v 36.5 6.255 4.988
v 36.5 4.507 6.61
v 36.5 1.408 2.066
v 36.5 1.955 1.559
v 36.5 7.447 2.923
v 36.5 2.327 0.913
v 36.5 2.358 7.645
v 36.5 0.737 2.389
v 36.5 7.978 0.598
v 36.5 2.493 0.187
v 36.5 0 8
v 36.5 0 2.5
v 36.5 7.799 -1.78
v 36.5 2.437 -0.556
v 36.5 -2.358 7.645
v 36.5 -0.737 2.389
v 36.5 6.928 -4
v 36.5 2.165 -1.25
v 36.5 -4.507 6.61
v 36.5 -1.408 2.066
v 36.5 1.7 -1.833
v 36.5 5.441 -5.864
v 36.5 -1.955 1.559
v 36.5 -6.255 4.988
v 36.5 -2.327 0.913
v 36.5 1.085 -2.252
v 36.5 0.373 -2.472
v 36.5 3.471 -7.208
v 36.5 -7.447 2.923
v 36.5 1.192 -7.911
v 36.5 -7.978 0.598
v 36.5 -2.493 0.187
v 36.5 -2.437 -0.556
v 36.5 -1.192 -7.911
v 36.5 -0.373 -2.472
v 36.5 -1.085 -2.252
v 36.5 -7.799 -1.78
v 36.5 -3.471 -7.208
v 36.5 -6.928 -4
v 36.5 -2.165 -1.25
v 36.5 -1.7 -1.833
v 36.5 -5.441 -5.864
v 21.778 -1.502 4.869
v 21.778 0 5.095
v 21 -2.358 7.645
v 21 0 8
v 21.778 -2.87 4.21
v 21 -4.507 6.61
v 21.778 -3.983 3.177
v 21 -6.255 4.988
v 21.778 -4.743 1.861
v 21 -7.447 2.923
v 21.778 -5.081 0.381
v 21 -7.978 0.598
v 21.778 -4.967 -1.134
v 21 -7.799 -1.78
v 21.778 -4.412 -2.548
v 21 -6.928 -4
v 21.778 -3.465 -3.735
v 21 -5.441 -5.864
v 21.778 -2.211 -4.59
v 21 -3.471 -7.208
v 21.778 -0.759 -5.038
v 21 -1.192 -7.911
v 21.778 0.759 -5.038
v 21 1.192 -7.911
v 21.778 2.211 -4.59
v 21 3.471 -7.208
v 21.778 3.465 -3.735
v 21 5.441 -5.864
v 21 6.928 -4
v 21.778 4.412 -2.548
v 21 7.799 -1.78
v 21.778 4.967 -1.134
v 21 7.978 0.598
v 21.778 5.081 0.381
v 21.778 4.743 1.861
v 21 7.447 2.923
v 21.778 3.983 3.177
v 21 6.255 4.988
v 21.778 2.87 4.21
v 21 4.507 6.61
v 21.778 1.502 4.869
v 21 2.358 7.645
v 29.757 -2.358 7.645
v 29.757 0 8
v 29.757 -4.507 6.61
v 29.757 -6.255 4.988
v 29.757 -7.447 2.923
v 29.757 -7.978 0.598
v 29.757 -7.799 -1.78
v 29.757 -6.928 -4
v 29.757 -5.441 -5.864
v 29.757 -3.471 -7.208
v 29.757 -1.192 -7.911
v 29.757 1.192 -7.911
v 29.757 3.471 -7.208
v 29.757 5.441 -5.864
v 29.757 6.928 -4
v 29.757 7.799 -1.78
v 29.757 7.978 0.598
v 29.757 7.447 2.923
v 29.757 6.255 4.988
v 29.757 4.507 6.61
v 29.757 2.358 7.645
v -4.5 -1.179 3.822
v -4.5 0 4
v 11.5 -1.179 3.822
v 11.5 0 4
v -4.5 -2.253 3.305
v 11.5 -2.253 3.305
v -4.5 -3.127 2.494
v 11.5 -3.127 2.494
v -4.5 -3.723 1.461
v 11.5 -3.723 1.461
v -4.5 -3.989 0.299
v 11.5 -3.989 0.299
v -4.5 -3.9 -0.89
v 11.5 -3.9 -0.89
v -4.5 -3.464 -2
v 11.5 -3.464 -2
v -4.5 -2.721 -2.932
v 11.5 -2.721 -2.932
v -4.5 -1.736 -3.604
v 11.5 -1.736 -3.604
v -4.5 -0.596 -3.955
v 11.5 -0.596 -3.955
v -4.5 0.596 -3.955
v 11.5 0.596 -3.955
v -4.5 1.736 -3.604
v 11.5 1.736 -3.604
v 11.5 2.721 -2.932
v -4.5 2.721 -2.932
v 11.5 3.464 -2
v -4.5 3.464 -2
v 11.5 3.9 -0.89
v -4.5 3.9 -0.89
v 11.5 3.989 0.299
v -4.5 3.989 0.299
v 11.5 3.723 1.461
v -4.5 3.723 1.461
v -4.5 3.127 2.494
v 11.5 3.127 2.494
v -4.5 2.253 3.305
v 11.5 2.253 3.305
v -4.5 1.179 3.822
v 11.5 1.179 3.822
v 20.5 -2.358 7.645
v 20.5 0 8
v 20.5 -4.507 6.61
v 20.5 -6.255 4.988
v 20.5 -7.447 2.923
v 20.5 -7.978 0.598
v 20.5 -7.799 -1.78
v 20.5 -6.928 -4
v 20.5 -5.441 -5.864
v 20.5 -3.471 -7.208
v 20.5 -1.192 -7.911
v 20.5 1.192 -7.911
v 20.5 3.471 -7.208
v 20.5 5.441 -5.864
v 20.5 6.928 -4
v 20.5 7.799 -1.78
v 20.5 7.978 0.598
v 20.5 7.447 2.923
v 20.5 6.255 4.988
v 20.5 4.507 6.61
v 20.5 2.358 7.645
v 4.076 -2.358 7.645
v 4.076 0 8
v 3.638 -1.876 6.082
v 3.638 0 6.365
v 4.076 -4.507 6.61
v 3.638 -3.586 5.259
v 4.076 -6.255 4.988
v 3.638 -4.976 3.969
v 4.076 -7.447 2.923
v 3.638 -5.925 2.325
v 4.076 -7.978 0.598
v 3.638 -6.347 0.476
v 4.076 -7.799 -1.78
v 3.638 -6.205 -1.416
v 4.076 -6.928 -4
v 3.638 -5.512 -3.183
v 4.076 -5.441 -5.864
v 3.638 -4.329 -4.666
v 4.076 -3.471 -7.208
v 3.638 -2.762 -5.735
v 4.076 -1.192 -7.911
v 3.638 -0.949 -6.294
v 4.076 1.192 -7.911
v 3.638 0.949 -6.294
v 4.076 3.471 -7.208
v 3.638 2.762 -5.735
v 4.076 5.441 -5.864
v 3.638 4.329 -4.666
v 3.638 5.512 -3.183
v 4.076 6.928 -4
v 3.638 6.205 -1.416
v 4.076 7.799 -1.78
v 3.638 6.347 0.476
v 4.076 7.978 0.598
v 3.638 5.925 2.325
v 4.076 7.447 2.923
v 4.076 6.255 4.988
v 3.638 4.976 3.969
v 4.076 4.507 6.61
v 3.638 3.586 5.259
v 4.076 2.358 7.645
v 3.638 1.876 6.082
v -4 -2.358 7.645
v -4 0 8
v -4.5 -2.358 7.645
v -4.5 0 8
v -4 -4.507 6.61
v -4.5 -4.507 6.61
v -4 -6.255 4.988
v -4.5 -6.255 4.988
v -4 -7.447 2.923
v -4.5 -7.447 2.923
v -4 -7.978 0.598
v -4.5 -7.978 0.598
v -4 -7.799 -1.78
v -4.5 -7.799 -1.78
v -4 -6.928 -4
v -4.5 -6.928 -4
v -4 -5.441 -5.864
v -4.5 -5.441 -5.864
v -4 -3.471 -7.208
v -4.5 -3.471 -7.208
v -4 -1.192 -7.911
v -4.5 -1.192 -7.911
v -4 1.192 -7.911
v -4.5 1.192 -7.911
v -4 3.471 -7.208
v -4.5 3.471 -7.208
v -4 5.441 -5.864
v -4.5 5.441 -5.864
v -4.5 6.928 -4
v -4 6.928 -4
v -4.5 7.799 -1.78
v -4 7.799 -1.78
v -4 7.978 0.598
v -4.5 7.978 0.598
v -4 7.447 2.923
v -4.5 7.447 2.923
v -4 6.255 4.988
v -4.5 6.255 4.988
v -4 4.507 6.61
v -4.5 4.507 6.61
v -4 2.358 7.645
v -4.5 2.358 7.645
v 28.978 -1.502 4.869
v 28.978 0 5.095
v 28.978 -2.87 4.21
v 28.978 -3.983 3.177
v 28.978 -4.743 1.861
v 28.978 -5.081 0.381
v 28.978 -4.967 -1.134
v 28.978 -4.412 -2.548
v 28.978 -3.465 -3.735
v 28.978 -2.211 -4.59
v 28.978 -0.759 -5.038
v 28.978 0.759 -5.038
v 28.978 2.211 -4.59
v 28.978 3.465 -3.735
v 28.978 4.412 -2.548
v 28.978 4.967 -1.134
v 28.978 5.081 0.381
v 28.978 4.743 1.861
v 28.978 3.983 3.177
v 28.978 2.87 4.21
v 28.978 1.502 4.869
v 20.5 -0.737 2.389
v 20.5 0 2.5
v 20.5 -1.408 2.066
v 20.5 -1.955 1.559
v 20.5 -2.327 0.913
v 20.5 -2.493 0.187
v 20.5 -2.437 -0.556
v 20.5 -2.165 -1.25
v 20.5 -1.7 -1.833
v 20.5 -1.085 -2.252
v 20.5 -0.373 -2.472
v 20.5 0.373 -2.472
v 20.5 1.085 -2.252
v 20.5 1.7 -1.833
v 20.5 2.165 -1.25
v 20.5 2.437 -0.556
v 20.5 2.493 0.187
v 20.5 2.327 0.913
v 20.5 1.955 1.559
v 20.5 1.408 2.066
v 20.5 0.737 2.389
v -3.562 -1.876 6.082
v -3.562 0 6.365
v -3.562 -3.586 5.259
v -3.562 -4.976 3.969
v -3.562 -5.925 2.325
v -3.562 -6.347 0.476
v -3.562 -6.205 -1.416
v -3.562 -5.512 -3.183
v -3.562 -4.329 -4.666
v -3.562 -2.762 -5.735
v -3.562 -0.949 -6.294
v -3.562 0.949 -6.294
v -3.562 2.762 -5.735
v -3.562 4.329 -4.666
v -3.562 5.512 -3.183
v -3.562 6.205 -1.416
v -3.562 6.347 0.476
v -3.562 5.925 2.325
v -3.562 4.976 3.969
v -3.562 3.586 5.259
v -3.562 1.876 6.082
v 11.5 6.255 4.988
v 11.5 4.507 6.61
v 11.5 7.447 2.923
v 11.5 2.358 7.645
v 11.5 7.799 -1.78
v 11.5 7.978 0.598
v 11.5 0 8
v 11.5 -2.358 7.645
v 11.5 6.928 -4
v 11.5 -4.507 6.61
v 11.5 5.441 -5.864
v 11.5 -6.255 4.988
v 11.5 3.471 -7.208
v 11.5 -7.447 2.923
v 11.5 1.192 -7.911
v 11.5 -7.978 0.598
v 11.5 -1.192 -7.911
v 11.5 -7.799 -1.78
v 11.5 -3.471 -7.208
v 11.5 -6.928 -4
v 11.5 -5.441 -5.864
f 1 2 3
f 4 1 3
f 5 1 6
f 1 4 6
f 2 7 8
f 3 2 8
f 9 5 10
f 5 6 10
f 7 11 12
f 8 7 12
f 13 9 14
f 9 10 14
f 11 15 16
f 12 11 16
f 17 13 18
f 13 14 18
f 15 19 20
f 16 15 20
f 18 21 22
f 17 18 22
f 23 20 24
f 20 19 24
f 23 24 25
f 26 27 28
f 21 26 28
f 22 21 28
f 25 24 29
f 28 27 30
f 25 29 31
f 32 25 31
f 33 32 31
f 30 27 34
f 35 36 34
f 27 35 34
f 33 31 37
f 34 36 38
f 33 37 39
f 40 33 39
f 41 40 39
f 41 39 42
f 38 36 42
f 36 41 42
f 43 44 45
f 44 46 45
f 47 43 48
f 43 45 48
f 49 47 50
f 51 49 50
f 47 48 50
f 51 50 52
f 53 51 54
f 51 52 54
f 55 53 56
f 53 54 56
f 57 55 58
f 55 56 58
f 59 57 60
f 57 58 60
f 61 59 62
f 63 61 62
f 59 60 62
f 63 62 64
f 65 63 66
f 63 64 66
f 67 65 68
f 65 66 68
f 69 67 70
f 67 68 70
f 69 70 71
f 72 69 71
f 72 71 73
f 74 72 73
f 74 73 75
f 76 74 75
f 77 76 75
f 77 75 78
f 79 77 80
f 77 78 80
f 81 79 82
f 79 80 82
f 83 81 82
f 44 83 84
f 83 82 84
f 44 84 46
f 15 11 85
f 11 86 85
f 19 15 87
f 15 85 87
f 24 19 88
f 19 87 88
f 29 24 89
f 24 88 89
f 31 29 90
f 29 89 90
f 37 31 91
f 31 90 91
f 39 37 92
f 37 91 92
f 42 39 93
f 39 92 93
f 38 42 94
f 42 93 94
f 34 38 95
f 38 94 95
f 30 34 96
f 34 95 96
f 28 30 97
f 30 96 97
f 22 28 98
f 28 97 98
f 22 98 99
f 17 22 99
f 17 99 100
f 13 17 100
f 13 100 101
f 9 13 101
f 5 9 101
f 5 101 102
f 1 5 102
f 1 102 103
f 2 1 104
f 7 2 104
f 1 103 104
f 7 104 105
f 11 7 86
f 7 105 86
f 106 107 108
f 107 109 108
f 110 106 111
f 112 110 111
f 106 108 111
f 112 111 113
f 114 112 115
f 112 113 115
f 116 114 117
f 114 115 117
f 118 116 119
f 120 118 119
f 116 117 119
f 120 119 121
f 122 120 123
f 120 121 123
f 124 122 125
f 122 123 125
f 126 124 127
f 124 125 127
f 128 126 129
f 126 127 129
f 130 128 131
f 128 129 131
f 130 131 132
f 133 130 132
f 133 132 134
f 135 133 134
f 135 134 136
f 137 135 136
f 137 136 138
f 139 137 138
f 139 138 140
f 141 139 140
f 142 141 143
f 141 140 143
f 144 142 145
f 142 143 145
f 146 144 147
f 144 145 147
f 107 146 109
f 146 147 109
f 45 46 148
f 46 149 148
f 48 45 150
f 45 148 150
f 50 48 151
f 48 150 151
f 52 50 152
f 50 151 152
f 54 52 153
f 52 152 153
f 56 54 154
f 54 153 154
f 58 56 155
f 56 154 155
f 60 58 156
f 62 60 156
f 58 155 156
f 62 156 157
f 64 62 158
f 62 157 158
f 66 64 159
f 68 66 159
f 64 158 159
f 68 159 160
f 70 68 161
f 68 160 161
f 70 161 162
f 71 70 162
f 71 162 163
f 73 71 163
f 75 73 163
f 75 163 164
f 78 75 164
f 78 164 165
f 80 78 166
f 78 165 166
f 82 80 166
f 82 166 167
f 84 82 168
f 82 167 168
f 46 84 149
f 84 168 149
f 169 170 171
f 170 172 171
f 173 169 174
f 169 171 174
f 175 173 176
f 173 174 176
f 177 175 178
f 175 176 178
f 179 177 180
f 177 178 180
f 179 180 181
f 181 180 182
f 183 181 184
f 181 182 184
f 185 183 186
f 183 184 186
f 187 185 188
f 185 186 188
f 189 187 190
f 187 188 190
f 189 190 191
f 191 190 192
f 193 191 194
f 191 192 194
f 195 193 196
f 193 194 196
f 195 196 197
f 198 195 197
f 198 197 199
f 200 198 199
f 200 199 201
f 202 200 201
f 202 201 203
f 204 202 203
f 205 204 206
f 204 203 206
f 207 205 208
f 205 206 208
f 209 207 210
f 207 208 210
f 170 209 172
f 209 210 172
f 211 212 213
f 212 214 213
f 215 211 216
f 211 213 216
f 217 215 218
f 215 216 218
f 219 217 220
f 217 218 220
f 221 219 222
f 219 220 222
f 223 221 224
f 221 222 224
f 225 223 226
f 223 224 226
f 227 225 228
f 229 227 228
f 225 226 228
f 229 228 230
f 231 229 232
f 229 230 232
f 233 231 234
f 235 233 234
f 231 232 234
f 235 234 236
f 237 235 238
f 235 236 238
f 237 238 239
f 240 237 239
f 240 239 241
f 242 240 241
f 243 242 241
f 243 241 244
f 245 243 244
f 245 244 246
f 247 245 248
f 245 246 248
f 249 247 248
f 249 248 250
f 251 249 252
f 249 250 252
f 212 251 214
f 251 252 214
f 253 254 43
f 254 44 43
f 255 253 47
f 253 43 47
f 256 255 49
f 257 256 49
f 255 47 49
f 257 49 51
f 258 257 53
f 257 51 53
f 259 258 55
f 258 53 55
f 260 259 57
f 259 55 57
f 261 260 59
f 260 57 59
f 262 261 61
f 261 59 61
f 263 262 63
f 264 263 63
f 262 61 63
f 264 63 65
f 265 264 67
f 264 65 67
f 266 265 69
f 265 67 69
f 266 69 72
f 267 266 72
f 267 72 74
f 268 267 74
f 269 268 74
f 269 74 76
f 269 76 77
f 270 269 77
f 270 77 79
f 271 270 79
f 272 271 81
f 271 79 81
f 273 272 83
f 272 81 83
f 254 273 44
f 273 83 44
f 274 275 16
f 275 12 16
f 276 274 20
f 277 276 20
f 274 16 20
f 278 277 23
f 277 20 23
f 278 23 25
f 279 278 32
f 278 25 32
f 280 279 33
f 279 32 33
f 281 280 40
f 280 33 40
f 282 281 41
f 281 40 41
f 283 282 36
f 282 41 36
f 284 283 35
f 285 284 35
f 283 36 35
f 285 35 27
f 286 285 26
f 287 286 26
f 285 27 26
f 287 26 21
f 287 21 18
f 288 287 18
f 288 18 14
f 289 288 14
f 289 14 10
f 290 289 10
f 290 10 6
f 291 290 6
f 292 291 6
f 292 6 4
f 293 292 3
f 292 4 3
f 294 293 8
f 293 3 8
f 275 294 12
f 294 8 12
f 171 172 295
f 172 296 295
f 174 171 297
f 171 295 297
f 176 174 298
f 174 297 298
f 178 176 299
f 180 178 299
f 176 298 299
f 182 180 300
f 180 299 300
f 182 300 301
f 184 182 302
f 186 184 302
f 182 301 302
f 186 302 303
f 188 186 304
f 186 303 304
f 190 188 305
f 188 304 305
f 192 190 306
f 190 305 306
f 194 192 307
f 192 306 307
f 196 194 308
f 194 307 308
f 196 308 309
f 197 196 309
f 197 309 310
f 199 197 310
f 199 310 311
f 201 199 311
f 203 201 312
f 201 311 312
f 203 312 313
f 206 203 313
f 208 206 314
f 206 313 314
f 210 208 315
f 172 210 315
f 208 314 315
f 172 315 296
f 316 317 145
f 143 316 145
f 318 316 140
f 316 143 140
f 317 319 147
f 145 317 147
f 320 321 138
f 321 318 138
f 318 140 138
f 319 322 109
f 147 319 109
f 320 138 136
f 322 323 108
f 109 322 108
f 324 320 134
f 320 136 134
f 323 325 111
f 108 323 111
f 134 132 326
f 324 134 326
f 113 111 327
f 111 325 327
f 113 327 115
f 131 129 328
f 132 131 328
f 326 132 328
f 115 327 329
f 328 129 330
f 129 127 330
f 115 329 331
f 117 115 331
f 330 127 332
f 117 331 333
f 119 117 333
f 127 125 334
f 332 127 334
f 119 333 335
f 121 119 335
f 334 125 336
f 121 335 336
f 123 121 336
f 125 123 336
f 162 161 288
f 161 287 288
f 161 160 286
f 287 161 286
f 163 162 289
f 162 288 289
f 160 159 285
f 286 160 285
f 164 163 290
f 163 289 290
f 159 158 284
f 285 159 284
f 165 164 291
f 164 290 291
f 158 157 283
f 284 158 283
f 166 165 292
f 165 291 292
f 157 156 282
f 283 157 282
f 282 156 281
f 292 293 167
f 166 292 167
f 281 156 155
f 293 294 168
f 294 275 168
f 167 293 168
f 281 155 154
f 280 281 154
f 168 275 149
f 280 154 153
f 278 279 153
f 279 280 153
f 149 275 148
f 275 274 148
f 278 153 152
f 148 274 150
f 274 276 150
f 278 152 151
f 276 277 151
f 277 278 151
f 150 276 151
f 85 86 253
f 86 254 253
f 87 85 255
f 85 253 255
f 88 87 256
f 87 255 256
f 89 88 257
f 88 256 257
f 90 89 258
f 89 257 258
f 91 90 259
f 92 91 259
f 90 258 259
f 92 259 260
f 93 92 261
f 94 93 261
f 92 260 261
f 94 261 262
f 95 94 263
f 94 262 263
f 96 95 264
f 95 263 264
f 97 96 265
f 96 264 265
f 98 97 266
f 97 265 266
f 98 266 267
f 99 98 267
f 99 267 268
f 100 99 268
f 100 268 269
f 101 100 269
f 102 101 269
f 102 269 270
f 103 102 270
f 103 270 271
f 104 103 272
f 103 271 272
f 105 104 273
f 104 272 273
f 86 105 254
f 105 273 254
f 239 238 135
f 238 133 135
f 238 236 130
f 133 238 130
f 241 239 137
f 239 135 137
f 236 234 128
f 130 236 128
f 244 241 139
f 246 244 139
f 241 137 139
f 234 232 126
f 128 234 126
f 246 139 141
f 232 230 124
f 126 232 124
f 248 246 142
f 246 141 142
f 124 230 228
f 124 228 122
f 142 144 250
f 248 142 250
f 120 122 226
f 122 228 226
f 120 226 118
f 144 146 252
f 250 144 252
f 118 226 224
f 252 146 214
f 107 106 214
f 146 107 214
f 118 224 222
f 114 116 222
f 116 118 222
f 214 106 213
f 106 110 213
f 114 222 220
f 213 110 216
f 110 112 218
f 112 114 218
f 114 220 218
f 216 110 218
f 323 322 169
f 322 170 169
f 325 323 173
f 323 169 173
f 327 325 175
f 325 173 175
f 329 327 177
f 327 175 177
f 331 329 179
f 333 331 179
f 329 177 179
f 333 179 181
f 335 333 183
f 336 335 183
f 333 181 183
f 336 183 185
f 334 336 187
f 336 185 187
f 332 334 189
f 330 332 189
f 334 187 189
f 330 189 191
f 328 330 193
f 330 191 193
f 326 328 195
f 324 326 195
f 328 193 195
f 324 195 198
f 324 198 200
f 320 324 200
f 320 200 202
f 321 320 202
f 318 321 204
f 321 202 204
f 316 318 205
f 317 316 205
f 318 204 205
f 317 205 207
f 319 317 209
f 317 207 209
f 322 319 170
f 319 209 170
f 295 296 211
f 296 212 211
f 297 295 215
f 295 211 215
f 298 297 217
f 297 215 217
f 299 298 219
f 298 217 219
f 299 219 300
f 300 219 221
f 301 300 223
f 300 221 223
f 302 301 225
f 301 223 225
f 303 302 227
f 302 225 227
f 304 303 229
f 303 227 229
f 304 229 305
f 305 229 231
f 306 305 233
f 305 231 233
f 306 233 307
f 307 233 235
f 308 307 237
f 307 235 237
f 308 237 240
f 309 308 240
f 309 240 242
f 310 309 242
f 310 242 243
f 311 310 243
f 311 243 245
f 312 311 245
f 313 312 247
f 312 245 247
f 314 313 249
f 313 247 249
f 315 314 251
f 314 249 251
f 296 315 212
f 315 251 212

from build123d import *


with BuildPart() as f1:
    # F0 (on Front) → F1 (revolve)
    with BuildSketch(Plane.XZ):
        Polygon((3.638097, 6.365), (-3.561903, 6.365), (-4, 8), (-4.5, 8), (-4.5, 4), (11.5, 4), (11.5, 8), (4.076194, 8), align=None)
    revolve(axis=Axis((20.584276, 0, 0), (1, 0, 0)))


with BuildPart() as f2:
    # F0 (on Front) → F2 (revolve)
    with BuildSketch(Plane.XZ):
        Polygon((20.5, 8), (20.5, 2.5), (36.5, 2.5), (36.5, 8), (29.756785, 8), (28.978392, 5.095), (21.778392, 5.095), (21, 8), align=None)
    revolve(axis=Axis((20.584276, 0, 0), (1, 0, 0)))


solid = Compound([f1.part, f2.part])
